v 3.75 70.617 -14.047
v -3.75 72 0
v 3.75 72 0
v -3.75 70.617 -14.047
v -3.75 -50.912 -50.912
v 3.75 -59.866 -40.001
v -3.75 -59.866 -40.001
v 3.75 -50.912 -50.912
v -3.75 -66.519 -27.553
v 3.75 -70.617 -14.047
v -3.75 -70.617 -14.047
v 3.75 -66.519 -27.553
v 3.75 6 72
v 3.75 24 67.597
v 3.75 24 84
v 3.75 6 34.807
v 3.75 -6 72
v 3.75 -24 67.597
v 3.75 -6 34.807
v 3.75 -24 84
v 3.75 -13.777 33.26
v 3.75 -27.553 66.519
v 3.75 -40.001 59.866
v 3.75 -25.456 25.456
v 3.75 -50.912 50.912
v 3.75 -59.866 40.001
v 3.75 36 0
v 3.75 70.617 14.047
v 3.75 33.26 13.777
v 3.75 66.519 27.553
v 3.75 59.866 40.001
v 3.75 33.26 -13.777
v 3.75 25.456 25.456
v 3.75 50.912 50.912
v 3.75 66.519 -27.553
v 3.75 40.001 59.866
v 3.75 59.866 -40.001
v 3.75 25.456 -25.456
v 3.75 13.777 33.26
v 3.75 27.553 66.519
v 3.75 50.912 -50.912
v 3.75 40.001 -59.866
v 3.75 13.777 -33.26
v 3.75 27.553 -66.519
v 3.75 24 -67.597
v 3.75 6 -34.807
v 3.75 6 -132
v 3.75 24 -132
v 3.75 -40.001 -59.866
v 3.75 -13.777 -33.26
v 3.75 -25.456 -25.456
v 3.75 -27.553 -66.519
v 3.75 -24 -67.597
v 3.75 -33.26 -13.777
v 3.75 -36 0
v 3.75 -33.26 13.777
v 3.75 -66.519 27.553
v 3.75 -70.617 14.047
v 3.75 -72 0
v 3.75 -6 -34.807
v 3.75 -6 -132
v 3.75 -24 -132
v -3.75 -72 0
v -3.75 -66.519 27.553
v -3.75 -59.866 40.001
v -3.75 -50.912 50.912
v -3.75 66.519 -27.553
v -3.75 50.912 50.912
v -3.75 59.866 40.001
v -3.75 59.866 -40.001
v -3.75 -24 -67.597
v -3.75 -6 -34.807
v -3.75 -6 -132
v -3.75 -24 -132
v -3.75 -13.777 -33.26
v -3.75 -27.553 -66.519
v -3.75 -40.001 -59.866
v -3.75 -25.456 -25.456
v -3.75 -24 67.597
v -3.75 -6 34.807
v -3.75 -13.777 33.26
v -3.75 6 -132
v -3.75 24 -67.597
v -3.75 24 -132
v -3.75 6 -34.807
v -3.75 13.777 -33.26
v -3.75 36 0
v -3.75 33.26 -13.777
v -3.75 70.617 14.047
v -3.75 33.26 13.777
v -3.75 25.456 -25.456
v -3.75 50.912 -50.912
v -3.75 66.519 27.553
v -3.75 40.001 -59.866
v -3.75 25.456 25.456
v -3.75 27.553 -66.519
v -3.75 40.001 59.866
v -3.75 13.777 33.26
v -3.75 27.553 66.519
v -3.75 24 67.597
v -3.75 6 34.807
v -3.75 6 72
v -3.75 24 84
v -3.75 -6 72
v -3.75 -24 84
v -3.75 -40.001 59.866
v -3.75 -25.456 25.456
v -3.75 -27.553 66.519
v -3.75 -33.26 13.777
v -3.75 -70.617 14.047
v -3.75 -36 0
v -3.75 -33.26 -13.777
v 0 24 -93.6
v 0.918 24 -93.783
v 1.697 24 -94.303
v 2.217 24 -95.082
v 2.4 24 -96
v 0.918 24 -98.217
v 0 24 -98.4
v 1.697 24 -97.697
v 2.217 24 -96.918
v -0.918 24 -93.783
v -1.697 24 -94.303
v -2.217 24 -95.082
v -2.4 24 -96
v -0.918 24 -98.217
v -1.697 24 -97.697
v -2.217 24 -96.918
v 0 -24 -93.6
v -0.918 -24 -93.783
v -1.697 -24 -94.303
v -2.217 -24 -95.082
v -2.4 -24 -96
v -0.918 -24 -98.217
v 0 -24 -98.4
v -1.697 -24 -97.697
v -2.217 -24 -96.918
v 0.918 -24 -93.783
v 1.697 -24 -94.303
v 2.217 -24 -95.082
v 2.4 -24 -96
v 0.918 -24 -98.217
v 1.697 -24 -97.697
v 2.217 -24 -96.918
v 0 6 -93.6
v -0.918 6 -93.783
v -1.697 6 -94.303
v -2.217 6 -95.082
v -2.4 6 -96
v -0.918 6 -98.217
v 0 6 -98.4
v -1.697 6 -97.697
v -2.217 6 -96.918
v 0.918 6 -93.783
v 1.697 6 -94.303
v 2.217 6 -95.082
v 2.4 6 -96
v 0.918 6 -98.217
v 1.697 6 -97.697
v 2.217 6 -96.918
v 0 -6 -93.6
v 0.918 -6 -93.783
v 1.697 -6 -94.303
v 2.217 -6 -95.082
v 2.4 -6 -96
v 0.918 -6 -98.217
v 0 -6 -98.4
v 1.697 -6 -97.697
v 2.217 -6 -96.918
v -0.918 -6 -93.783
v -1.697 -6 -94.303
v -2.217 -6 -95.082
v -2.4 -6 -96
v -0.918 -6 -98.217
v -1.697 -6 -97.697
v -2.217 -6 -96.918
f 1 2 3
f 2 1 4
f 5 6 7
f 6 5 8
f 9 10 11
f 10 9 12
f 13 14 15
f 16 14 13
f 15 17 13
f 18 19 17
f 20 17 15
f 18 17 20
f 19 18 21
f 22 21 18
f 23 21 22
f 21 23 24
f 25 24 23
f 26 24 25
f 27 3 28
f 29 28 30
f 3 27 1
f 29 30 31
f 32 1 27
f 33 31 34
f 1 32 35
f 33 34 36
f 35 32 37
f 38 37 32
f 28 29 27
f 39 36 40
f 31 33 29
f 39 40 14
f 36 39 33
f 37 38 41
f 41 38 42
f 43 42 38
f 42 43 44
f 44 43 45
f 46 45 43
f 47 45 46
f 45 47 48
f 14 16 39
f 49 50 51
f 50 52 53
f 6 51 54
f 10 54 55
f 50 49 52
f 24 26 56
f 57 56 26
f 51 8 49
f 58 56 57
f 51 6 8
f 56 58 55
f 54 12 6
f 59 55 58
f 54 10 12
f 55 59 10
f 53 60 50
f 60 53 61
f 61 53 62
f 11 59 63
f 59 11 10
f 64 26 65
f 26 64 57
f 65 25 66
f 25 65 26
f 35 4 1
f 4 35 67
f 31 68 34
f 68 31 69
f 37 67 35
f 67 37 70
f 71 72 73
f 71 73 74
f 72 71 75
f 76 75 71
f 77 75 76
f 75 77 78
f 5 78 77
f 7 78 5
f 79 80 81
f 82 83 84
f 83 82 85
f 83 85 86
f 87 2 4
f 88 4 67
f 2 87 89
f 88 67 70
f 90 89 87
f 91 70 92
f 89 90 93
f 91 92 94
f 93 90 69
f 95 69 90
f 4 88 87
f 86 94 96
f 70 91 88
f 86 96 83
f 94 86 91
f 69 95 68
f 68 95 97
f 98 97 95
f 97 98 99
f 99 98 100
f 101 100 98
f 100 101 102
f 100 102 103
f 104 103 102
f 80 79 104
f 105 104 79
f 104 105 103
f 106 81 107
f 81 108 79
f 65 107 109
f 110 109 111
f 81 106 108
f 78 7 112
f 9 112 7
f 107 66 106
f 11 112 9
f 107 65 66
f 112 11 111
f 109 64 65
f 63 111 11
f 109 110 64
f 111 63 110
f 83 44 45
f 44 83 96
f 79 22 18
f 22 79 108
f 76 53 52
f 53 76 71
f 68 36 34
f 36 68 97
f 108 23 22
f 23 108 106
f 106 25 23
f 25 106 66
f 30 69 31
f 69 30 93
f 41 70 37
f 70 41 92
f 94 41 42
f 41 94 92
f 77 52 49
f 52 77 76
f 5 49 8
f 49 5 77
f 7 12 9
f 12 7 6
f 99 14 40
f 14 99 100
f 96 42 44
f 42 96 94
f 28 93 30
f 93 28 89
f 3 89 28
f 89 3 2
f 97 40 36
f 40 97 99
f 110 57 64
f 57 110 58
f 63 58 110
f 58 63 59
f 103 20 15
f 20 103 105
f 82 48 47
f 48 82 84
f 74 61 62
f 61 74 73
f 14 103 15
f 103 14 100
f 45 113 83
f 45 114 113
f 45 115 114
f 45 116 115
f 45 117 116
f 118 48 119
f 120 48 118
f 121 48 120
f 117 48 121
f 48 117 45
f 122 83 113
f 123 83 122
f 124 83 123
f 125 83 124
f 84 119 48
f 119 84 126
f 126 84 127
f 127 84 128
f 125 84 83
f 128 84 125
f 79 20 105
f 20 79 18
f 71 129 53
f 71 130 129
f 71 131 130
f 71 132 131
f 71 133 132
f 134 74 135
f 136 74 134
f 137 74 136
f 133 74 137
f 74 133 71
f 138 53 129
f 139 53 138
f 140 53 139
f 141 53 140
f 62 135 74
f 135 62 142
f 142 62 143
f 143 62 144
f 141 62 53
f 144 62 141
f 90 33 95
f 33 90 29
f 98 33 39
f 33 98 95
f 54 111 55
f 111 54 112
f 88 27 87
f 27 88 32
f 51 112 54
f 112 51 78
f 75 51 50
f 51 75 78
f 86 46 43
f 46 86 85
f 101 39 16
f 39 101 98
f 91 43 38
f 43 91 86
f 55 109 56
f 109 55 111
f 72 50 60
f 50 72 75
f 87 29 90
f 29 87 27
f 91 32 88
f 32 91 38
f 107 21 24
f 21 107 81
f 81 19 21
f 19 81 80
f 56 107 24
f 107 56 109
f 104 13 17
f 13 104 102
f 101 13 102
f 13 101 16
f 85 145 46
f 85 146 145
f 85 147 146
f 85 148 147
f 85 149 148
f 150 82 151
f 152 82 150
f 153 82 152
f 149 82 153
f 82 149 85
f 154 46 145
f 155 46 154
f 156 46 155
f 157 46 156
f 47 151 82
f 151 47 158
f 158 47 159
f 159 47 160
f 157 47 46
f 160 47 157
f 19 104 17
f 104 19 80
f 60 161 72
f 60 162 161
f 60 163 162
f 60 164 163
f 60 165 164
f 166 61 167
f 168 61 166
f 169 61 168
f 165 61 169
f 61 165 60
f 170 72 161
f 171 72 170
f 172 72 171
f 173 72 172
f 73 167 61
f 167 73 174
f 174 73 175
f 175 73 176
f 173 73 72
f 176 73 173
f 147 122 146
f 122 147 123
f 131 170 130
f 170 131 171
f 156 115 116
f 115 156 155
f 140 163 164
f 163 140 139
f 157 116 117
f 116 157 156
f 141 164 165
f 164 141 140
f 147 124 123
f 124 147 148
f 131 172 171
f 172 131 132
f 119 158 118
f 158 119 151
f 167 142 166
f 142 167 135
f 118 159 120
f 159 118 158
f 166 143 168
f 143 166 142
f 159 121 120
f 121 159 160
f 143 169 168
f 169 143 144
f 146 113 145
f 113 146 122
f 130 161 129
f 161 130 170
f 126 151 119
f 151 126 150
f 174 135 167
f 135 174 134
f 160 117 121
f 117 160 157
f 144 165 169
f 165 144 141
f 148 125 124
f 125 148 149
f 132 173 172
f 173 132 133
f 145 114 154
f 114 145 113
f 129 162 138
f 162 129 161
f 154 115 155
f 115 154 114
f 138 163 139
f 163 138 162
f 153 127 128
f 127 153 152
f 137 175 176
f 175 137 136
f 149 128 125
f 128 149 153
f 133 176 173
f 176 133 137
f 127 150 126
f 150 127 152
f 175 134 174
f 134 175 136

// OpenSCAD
// file: ../../lib_v2/scad/globalParams.scad
//base params
gFn 			= 1; 											// $fn parameter
gLengthBase 	= 300; 											// mm
gM				= 8;											// use M8 bars
gbTestInPlace  = false;										// used to test modules in place
gMB				= 4;											// use M4 bolts;		
gPrnRes			= 0.4;											// printer resolution

//additional params
gLengthBaseX 	= gLengthBase;
gLengthBaseY 	= gLengthBase;
gLengthBaseZ 	= gLengthBase;
gM_2			= (gM/2);
gM_4			= (gM/4);
gM2				= (gM*2);
gMB_2			= (gMB/2);

gRBHole 		= (gMB_2+gPrnRes);
// file: ../../lib_v2/scad/linearBearing.scad
// linear bearings LLxUU: LL8UU, LL6UU
// linear bearings LMKxUU: LMK8UU, LMK6UU, LMK8SUU
include <../scad/globalParams.scad>

Fn = gFn;
bTestInPlace = gbTestInPlace;

// [0]M/2, [1]Length, [2]Diameter/2, [3]slotDiameter/2, [4]slotWidth, [5]slotDistance
LL6UU = [3, 19, (12/2), (11.5/2), 1.1, 11.3];
LL8UU = [4, 24, (15/2), (14.3/2), 1.1, 15.3];

module LLxUU(_posX=0, _posY=0, _posZ=0, _rotX=0, _rotY=0, _rotZ=0, _clr="grey", _type=LL8UU){
	translate([_posX, _posY, _posZ])
		rotate([_rotX, _rotY, _rotZ])
			color(_clr)
				difference(){
					union(){
						cylinder(_type[1], _type[3], _type[3], $fn=_type[2]*2*Fn);
						cylinder(((_type[1]-_type[4]*2-_type[5])/2), _type[2], _type[2], $fn=_type[2]*2*Fn);
						translate([0,0,((_type[1]-_type[4]*2-_type[5])/2+_type[4])])
							cylinder((_type[5]), _type[2], _type[2], $fn=_type[2]*2*Fn);
						translate([0,0,((_type[1]-_type[4]*2-_type[5])/2+_type[4]*2+_type[5])])
							cylinder(((_type[1]-_type[4]*2-_type[5])/2), _type[2], _type[2], $fn=_type[2]*2*Fn);
					} //union
					translate([0,0,-1])
						cylinder(_type[1]+2, _type[0], _type[0], $fn=_type[0]*2*Fn);
				} //difference
} //module LLxUU

//LL8UU_
module LL8UU_x(pX=0, pY=0, pZ=0, clr="grey"){
		LLxUU(_posX=pX, _posY=pY, _posZ=pZ, _rotY=90, _clr=clr);
}
module LL8UU_y(pX=0, pY=0, pZ=0, clr="grey"){
		LLxUU(_posX=pX, _posY=pY, _posZ=pZ, _rotX=-90, _clr=clr);
}
module LL8UU_z(pX=0, pY=0, pZ=0, clr="grey"){
		LLxUU(_posX=pX, _posY=pY, _posZ=pZ, _rotZ=90, _clr=clr);
}

//LL6UU_
module LL6UU_x(pX=0, pY=0, pZ=0, clr="grey"){
		LLxUU(_posX=pX, _posY=pY, _posZ=pZ, _rotY=90, _clr=clr, _type=LL6UU);
}
module LL6UU_y(pX=0, pY=0, pZ=0, clr="grey"){
		LLxUU(_posX=pX, _posY=pY, _posZ=pZ, _rotX=-90, _clr=clr, _type=LL6UU);
}
module LL6UU_z(pX=0, pY=0, pZ=0, clr="grey"){
		LLxUU(_posX=pX, _posY=pY, _posZ=pZ, _rotZ=90, _clr=clr, _type=LL6UU);
}

// [0]M/2, [1]Length, [2]Diameter/2, [3]supportDiameter/2, [4]supportHeight, [5]supportHolesSmall/2,
// [6]supportHolesBig/2, [7]supportHolesBigHeight, [8]supportHolesPosDiam/2
LMK6UU = [3, 19, (12/2), (28/2), 5, (3.5/2), (6/2), 3.1, (20/2)];
LMK8UU = [4, 24, (15/2), (32/2), 5, (3.5/2), (6/2), 3.1, (24/2)];
LMK8SUU = [4, 17, (15/2), (32/2), 5, (3.5/2), (6/2), 3.1, (24/2)];

module LMKxUU(_posX=0, _posY=0, _posZ=0, _rotX=0, _rotY=0, _rotZ=0, _clr="grey", _type=LMK8UU){
	translate([_posX, _posY, _posZ])
		rotate([_rotX, _rotY, _rotZ])
			color(_clr)
	difference(){	
		union(){
			cylinder(_type[1],_type[2],_type[2], $fn=_type[2]*2*Fn);
			rotate([0,0,45])
				cylinder(_type[4],_type[3],_type[3], $fn=4);
		}//union
		translate([0,0,-1])	
		cylinder(_type[1]+2,_type[0],_type[0], $fn=_type[0]*2*Fn);
		for(angle = [45:90:350]){
			translate([(_type[8]*sin(angle)), (_type[8]*cos(angle)), -1])
				cylinder(_type[4]+2, _type[5], _type[5], $fn=_type[5]*2*Fn);
			translate([(_type[8]*sin(angle)), (_type[8]*cos(angle)), -1])
				cylinder(_type[7]+1, _type[6], _type[6], $fn=_type[6]*2*Fn);
		} //for
	} //difference
} //module LMKxUU

//LL8UU_
module LMK8UU_x(pX=0, pY=0, pZ=0, clr="grey"){
		LMKxUU(_posX=pX, _posY=pY, _posZ=pZ, _rotY=90, _clr=clr);
}
module LMK8UU_y(pX=0, pY=0, pZ=0, clr="grey"){
		LMKxUU(_posX=pX, _posY=pY, _posZ=pZ, _rotX=-90, _clr=clr);
}
module LMK8UU_z(pX=0, pY=0, pZ=0, clr="grey"){
		LMKxUU(_posX=pX, _posY=pY, _posZ=pZ, _rotZ=90, _clr=clr);
}	

//LL8SUU_
module LMK8SUU_x(pX=0, pY=0, pZ=0, clr="grey"){
		LMKxUU(_posX=pX, _posY=pY, _posZ=pZ, _rotY=90, _clr=clr, _type=LMK8SUU);
}
module LMK8SUU_y(pX=0, pY=0, pZ=0, clr="grey"){
		LMKxUU(_posX=pX, _posY=pY, _posZ=pZ, _rotX=-90, _clr=clr, _type=LMK8SUU);
}
module LMK8SUU_z(pX=0, pY=0, pZ=0, clr="grey"){
		LMKxUU(_posX=pX, _posY=pY, _posZ=pZ, _rotZ=90, _clr=clr, _type=LMK8SUU);
}

//LL6UU_
module LMK6UU_x(pX=0, pY=0, pZ=0, clr="grey"){
		LMKxUU(_posX=pX, _posY=pY, _posZ=pZ, _rotY=90, _clr=clr, _type=LMK6UU);
}
module LMK6UU_y(pX=0, pY=0, pZ=0, clr="grey"){
		LMKxUU(_posX=pX, _posY=pY, _posZ=pZ, _rotX=-90, _clr=clr, _type=LMK6UU);
}
module LMK6UU_z(pX=0, pY=0, pZ=0, clr="grey"){
		LMKxUU(_posX=pX, _posY=pY, _posZ=pZ, _rotZ=90, _clr=clr, _type=LMK6UU);
}	

//tests
if (bTestInPlace){
	//LLxUU();
	LL8UU_x(pX=60);
	LL8UU_y(pX=40);
	LL8UU_z(pX=20);
	LL6UU_x(pX=60, pY=40);
	LL6UU_y(pX=40, pY=40);
	LL6UU_z(pX=20, pY=40);
	
	//LMKxUU();
	LMK8UU_x(pX=-120);
	LMK8UU_y(pX=-80);
	LMK8UU_z(pX=-40);
	LMK8SUU_x(pX=-120, pY=40);
	LMK8SUU_y(pX=-80, pY=40);
	LMK8SUU_z(pX=-40, pY=40);
	LMK6UU_x(pX=-120, pY=80);
	LMK6UU_y(pX=-80, pY=80);
	LMK6UU_z(pX=-40, pY=80);
}
// file: ../../lib_v2/scad/holderLL8UU_H.scad
// holder for LL8UU
include <../../lib_v2/scad/linearBearing.scad>

// [0] std name, [1] sizeX, [2] sizeY
vHotBedHolder = ["hotBedHolder,", 100, 100];
// main file
// holder for LL8UU

include <../../lib_v2/scad/holderLL8UU_H.scad>
Fn = gFn*4;
bTestInPlace = gbTestInPlace;

// [0] strName [1]M/2, [2]Length, [3]Diameter/2, [4]slotDiameter/2, [5]slotWidth, [6]slotDistance
// LL8UU = [4, 24, (15/2), (14.3/2), 1.1, 15.3];

//vHBHolder = ["hotBedHolder", 160, 160];

difference(){
    union(){
        translate([-LL8UU[2]/2, 0, 0])
        rotate([0,90,0])
            cylinder(LL8UU[2], LL8UU[1]*3, LL8UU[1]*3, $fn = Fn*8);
        translate([-LL8UU[2]/2, -LL8UU[1], -LL8UU[1]*5.5])
            cube([LL8UU[2],LL8UU[1]*2,LL8UU[1]*9]);
    }

    LL8UU_x(pX=0, clr=[0.5,1,0.5]);	
    translate([-LL8UU[2]/2, 0, 0])
    rotate([0,90,0])
        cylinder(LL8UU[2], LL8UU[1]*1.5, LL8UU[1]*1.5, $fn = Fn*4);
    translate([-LL8UU[2]/2, -LL8UU[1]/4, -LL8UU[1]*6])
        cube([LL8UU[2],LL8UU[1]/2,LL8UU[1]*9]);
    translate([0, LL8UU[1]*1.5, -LL8UU[1]*4])
    rotate([90,0,0])
        cylinder(LL8UU[1]*3, 2.4, 2.4, $fn= Fn*4); //M4
}
